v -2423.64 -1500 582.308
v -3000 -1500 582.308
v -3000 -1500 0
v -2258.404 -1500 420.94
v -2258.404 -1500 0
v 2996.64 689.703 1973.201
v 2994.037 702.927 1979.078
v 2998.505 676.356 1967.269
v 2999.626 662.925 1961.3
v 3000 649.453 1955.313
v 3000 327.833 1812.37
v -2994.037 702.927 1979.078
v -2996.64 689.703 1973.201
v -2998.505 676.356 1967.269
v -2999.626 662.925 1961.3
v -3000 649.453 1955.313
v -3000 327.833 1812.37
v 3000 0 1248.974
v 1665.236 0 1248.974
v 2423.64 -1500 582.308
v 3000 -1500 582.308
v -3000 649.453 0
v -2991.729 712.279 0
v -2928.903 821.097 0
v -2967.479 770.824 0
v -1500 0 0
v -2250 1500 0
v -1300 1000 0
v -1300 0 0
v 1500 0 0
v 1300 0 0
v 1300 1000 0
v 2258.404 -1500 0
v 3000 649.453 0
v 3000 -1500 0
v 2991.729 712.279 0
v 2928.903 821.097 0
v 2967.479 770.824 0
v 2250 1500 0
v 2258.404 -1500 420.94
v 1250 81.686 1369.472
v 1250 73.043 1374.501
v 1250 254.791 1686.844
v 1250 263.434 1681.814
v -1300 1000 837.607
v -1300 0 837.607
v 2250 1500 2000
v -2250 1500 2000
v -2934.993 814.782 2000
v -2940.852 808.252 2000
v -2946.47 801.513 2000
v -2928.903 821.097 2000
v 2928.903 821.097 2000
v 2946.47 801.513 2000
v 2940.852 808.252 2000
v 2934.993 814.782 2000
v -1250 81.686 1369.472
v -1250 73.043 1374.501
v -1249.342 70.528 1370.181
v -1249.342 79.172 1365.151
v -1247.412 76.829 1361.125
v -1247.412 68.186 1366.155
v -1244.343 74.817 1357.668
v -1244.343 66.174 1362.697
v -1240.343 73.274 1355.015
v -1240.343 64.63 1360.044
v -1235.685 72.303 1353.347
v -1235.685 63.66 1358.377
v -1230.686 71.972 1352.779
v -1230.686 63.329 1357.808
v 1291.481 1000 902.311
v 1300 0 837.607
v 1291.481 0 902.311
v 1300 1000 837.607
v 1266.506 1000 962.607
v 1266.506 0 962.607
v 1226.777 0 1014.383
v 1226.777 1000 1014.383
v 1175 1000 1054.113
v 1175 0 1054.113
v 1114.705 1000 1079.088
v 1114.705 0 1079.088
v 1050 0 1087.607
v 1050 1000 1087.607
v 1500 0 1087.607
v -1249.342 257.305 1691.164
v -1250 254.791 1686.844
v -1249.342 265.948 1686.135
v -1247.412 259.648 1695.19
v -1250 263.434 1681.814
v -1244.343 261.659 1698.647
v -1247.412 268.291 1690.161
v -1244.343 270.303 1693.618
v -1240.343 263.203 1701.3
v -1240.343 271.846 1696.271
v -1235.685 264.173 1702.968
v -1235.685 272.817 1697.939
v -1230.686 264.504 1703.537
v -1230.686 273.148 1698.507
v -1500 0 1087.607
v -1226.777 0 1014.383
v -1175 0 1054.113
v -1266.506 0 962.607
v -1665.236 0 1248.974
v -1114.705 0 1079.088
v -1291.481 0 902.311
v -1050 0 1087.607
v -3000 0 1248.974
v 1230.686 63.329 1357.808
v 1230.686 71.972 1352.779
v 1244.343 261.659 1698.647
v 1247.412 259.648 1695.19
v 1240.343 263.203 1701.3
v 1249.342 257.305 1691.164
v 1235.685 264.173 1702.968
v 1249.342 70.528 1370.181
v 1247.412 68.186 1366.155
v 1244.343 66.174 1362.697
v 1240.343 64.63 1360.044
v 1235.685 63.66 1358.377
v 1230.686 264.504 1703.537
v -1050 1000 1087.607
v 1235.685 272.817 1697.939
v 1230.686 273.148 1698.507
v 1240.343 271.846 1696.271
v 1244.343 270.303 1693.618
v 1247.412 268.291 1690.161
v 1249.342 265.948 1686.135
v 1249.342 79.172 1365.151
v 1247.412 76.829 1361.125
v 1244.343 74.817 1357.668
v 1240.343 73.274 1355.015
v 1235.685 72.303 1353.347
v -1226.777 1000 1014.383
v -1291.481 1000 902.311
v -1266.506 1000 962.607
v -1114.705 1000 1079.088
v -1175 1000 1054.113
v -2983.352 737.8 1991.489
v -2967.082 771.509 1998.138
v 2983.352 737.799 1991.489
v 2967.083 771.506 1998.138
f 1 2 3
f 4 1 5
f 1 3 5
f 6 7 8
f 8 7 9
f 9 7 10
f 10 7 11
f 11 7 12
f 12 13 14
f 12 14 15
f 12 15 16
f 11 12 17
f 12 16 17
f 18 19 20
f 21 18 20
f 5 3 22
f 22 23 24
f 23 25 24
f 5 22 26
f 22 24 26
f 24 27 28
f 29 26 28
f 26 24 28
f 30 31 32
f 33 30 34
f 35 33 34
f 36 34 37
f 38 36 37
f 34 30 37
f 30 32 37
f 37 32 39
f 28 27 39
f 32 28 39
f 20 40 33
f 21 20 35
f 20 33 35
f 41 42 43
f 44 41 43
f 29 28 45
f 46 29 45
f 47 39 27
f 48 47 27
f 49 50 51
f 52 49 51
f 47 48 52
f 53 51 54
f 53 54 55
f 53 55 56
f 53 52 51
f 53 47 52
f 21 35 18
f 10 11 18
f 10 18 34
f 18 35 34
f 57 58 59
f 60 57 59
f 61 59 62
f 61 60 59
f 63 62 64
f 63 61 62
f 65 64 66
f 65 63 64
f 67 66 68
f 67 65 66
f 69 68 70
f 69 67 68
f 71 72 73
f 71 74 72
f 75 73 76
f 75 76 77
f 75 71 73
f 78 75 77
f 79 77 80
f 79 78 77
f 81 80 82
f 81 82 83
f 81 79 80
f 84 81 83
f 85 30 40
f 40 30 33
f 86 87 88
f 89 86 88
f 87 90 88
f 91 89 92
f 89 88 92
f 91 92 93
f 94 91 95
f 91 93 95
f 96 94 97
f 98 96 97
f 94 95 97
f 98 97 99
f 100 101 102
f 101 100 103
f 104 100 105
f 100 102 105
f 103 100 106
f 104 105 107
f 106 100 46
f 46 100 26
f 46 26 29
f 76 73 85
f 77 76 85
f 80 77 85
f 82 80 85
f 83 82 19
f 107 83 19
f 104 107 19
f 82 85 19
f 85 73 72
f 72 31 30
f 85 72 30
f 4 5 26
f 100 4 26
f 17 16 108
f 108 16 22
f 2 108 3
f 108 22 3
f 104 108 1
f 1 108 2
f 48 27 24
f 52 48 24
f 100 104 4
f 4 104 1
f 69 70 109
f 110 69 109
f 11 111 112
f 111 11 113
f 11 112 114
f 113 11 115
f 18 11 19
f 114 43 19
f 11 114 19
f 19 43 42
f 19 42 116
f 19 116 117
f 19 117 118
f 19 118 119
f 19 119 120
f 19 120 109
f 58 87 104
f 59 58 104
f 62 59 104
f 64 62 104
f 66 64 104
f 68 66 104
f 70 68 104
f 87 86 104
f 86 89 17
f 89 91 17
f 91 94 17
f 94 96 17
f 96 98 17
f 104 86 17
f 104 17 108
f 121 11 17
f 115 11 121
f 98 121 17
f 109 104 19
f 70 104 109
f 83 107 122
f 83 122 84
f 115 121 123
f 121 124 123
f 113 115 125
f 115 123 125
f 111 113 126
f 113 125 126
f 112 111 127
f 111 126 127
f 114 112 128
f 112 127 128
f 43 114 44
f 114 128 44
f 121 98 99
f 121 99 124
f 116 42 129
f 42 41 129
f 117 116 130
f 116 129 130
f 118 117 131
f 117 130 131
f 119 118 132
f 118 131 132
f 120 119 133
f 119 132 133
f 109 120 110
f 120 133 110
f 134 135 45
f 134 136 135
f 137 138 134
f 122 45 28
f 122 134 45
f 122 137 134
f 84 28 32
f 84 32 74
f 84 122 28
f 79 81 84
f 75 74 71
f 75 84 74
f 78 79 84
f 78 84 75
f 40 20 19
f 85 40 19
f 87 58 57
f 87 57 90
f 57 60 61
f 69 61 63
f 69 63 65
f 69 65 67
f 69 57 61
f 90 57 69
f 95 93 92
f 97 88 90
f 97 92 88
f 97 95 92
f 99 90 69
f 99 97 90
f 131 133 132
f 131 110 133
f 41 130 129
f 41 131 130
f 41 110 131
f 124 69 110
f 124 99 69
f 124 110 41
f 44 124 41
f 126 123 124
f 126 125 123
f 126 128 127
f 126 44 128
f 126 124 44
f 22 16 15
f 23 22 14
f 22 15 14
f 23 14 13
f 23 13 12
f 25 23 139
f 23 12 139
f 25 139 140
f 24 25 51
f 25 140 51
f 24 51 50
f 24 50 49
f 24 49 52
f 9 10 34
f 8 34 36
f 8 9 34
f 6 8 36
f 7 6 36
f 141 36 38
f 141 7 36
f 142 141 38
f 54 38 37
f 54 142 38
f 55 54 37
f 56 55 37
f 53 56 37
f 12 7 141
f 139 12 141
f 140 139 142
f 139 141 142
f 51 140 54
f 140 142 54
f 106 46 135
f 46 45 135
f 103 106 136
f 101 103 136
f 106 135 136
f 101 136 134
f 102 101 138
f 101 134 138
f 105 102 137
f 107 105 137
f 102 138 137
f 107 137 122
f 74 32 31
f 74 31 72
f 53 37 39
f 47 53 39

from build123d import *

# Parameters (mm, degrees)
F1_DEPTH = 2000
F3_DEPTH = 6000.001
F4_SIZE  = 150
F5_W     = 2600
F5_H     = 1087.6065318632
F6_DEPTH = 1000
F7_W     = 2500
F7_H     = 400
F8_DEPTH = 10
F9_R     = 19.313708499
F10_F1_R = 242.7414236909
F10_F2_R = 242.7414236909
F10_F3_R = 242.7414236909
F11_R    = 250


with BuildPart() as f1:
    # F0 (on Top) → F1 (new body)
    with BuildSketch(Plane.XY):
        Polygon((-3000, -1500), (-2258.4035396576, -1500), (-1500, 0), (1500, 0), (2258.4035396576, -1500), (3000, -1500), (3000, 750), (2250, 1500), (-2250, 1500), (-3000, 750), align=None)
    extrude(amount=F1_DEPTH)

    # F2 (on face) → F3 (cut, through all)
    with BuildSketch(Plane(origin=(-3000, 0, 0), x_dir=(0, -1, 0), z_dir=(-1, 0, 0))):
        Polygon((1500, 2000), (-750, 2000), (-327.833239258, 1812.3703285591), (1500, 1000), align=None)
        Polygon((1500, 1000), (-327.833239258, 1812.3703285591), (0, 1248.974442482), (1500, 582.3077758153), align=None)
    extrude(amount=-F3_DEPTH, mode=Mode.SUBTRACT)

    # F4
    f4_edges = [f1.edges().sort_by_distance(p)[0] for p in [
        (-1879.20177, -750, 915.641109),
        (1879.20177, -750, 915.641109),
    ]]
    chamfer(f4_edges, length=F4_SIZE)

    # F5 (on face) → F6 (cut)
    with BuildSketch(Plane.XZ):
        with Locations((0, 543.8032659316)):
            Rectangle(F5_W, F5_H)
    extrude(amount=-F6_DEPTH, mode=Mode.SUBTRACT)

    # F7 (on face) → F8 (cut)
    with BuildSketch(Plane(origin=(0, -542.9303888793, 315.9246144256), x_dir=(1, 0, 0), z_dir=(0, -0.86432215, 0.5029385858))):
        with Locations((0, 1405.4340400094)):
            Rectangle(F7_W, F7_H)
    extrude(amount=-F8_DEPTH, mode=Mode.SUBTRACT)

    # F9
    f9_edges = [f1.edges().sort_by_distance(p)[0] for p in [
        (-1250, 67.650513, 1355.293263),
        (-1250, 268.825948, 1701.022123),
        (1250, 268.825948, 1701.022123),
        (1250, 67.650513, 1355.293263),
    ]]
    fillet(f9_edges, radius=F9_R)

    # F10: fillet of radius 242.7414236909 on 3 edges, made by hand

    # F10_f1
    f10_f1_edges = [f1.edges().sort_by_distance(p)[0] for p in [
        (-3000, 750, 1000),
    ]]
    fillet(f10_f1_edges, radius=F10_F1_R)

    # F10_f2
    f10_f2_edges = [f1.edges().sort_by_distance(p)[0] for p in [
        (10.9015511853, 750, 2000),
    ]]
    fillet(f10_f2_edges, radius=F10_F2_R)

    # F10_f3
    f10_f3_edges = [f1.edges().sort_by_distance(p)[0] for p in [
        (3000, 750, 997.2355539079),
    ]]
    fillet(f10_f3_edges, radius=F10_F3_R)

    # F11
    f11_edges = [f1.edges().sort_by_distance(p)[0] for p in [
        (-1300, 500, 1087.606532),
        (1300, 500, 1087.606532),
    ]]
    fillet(f11_edges, radius=F11_R)


solid = f1.part
